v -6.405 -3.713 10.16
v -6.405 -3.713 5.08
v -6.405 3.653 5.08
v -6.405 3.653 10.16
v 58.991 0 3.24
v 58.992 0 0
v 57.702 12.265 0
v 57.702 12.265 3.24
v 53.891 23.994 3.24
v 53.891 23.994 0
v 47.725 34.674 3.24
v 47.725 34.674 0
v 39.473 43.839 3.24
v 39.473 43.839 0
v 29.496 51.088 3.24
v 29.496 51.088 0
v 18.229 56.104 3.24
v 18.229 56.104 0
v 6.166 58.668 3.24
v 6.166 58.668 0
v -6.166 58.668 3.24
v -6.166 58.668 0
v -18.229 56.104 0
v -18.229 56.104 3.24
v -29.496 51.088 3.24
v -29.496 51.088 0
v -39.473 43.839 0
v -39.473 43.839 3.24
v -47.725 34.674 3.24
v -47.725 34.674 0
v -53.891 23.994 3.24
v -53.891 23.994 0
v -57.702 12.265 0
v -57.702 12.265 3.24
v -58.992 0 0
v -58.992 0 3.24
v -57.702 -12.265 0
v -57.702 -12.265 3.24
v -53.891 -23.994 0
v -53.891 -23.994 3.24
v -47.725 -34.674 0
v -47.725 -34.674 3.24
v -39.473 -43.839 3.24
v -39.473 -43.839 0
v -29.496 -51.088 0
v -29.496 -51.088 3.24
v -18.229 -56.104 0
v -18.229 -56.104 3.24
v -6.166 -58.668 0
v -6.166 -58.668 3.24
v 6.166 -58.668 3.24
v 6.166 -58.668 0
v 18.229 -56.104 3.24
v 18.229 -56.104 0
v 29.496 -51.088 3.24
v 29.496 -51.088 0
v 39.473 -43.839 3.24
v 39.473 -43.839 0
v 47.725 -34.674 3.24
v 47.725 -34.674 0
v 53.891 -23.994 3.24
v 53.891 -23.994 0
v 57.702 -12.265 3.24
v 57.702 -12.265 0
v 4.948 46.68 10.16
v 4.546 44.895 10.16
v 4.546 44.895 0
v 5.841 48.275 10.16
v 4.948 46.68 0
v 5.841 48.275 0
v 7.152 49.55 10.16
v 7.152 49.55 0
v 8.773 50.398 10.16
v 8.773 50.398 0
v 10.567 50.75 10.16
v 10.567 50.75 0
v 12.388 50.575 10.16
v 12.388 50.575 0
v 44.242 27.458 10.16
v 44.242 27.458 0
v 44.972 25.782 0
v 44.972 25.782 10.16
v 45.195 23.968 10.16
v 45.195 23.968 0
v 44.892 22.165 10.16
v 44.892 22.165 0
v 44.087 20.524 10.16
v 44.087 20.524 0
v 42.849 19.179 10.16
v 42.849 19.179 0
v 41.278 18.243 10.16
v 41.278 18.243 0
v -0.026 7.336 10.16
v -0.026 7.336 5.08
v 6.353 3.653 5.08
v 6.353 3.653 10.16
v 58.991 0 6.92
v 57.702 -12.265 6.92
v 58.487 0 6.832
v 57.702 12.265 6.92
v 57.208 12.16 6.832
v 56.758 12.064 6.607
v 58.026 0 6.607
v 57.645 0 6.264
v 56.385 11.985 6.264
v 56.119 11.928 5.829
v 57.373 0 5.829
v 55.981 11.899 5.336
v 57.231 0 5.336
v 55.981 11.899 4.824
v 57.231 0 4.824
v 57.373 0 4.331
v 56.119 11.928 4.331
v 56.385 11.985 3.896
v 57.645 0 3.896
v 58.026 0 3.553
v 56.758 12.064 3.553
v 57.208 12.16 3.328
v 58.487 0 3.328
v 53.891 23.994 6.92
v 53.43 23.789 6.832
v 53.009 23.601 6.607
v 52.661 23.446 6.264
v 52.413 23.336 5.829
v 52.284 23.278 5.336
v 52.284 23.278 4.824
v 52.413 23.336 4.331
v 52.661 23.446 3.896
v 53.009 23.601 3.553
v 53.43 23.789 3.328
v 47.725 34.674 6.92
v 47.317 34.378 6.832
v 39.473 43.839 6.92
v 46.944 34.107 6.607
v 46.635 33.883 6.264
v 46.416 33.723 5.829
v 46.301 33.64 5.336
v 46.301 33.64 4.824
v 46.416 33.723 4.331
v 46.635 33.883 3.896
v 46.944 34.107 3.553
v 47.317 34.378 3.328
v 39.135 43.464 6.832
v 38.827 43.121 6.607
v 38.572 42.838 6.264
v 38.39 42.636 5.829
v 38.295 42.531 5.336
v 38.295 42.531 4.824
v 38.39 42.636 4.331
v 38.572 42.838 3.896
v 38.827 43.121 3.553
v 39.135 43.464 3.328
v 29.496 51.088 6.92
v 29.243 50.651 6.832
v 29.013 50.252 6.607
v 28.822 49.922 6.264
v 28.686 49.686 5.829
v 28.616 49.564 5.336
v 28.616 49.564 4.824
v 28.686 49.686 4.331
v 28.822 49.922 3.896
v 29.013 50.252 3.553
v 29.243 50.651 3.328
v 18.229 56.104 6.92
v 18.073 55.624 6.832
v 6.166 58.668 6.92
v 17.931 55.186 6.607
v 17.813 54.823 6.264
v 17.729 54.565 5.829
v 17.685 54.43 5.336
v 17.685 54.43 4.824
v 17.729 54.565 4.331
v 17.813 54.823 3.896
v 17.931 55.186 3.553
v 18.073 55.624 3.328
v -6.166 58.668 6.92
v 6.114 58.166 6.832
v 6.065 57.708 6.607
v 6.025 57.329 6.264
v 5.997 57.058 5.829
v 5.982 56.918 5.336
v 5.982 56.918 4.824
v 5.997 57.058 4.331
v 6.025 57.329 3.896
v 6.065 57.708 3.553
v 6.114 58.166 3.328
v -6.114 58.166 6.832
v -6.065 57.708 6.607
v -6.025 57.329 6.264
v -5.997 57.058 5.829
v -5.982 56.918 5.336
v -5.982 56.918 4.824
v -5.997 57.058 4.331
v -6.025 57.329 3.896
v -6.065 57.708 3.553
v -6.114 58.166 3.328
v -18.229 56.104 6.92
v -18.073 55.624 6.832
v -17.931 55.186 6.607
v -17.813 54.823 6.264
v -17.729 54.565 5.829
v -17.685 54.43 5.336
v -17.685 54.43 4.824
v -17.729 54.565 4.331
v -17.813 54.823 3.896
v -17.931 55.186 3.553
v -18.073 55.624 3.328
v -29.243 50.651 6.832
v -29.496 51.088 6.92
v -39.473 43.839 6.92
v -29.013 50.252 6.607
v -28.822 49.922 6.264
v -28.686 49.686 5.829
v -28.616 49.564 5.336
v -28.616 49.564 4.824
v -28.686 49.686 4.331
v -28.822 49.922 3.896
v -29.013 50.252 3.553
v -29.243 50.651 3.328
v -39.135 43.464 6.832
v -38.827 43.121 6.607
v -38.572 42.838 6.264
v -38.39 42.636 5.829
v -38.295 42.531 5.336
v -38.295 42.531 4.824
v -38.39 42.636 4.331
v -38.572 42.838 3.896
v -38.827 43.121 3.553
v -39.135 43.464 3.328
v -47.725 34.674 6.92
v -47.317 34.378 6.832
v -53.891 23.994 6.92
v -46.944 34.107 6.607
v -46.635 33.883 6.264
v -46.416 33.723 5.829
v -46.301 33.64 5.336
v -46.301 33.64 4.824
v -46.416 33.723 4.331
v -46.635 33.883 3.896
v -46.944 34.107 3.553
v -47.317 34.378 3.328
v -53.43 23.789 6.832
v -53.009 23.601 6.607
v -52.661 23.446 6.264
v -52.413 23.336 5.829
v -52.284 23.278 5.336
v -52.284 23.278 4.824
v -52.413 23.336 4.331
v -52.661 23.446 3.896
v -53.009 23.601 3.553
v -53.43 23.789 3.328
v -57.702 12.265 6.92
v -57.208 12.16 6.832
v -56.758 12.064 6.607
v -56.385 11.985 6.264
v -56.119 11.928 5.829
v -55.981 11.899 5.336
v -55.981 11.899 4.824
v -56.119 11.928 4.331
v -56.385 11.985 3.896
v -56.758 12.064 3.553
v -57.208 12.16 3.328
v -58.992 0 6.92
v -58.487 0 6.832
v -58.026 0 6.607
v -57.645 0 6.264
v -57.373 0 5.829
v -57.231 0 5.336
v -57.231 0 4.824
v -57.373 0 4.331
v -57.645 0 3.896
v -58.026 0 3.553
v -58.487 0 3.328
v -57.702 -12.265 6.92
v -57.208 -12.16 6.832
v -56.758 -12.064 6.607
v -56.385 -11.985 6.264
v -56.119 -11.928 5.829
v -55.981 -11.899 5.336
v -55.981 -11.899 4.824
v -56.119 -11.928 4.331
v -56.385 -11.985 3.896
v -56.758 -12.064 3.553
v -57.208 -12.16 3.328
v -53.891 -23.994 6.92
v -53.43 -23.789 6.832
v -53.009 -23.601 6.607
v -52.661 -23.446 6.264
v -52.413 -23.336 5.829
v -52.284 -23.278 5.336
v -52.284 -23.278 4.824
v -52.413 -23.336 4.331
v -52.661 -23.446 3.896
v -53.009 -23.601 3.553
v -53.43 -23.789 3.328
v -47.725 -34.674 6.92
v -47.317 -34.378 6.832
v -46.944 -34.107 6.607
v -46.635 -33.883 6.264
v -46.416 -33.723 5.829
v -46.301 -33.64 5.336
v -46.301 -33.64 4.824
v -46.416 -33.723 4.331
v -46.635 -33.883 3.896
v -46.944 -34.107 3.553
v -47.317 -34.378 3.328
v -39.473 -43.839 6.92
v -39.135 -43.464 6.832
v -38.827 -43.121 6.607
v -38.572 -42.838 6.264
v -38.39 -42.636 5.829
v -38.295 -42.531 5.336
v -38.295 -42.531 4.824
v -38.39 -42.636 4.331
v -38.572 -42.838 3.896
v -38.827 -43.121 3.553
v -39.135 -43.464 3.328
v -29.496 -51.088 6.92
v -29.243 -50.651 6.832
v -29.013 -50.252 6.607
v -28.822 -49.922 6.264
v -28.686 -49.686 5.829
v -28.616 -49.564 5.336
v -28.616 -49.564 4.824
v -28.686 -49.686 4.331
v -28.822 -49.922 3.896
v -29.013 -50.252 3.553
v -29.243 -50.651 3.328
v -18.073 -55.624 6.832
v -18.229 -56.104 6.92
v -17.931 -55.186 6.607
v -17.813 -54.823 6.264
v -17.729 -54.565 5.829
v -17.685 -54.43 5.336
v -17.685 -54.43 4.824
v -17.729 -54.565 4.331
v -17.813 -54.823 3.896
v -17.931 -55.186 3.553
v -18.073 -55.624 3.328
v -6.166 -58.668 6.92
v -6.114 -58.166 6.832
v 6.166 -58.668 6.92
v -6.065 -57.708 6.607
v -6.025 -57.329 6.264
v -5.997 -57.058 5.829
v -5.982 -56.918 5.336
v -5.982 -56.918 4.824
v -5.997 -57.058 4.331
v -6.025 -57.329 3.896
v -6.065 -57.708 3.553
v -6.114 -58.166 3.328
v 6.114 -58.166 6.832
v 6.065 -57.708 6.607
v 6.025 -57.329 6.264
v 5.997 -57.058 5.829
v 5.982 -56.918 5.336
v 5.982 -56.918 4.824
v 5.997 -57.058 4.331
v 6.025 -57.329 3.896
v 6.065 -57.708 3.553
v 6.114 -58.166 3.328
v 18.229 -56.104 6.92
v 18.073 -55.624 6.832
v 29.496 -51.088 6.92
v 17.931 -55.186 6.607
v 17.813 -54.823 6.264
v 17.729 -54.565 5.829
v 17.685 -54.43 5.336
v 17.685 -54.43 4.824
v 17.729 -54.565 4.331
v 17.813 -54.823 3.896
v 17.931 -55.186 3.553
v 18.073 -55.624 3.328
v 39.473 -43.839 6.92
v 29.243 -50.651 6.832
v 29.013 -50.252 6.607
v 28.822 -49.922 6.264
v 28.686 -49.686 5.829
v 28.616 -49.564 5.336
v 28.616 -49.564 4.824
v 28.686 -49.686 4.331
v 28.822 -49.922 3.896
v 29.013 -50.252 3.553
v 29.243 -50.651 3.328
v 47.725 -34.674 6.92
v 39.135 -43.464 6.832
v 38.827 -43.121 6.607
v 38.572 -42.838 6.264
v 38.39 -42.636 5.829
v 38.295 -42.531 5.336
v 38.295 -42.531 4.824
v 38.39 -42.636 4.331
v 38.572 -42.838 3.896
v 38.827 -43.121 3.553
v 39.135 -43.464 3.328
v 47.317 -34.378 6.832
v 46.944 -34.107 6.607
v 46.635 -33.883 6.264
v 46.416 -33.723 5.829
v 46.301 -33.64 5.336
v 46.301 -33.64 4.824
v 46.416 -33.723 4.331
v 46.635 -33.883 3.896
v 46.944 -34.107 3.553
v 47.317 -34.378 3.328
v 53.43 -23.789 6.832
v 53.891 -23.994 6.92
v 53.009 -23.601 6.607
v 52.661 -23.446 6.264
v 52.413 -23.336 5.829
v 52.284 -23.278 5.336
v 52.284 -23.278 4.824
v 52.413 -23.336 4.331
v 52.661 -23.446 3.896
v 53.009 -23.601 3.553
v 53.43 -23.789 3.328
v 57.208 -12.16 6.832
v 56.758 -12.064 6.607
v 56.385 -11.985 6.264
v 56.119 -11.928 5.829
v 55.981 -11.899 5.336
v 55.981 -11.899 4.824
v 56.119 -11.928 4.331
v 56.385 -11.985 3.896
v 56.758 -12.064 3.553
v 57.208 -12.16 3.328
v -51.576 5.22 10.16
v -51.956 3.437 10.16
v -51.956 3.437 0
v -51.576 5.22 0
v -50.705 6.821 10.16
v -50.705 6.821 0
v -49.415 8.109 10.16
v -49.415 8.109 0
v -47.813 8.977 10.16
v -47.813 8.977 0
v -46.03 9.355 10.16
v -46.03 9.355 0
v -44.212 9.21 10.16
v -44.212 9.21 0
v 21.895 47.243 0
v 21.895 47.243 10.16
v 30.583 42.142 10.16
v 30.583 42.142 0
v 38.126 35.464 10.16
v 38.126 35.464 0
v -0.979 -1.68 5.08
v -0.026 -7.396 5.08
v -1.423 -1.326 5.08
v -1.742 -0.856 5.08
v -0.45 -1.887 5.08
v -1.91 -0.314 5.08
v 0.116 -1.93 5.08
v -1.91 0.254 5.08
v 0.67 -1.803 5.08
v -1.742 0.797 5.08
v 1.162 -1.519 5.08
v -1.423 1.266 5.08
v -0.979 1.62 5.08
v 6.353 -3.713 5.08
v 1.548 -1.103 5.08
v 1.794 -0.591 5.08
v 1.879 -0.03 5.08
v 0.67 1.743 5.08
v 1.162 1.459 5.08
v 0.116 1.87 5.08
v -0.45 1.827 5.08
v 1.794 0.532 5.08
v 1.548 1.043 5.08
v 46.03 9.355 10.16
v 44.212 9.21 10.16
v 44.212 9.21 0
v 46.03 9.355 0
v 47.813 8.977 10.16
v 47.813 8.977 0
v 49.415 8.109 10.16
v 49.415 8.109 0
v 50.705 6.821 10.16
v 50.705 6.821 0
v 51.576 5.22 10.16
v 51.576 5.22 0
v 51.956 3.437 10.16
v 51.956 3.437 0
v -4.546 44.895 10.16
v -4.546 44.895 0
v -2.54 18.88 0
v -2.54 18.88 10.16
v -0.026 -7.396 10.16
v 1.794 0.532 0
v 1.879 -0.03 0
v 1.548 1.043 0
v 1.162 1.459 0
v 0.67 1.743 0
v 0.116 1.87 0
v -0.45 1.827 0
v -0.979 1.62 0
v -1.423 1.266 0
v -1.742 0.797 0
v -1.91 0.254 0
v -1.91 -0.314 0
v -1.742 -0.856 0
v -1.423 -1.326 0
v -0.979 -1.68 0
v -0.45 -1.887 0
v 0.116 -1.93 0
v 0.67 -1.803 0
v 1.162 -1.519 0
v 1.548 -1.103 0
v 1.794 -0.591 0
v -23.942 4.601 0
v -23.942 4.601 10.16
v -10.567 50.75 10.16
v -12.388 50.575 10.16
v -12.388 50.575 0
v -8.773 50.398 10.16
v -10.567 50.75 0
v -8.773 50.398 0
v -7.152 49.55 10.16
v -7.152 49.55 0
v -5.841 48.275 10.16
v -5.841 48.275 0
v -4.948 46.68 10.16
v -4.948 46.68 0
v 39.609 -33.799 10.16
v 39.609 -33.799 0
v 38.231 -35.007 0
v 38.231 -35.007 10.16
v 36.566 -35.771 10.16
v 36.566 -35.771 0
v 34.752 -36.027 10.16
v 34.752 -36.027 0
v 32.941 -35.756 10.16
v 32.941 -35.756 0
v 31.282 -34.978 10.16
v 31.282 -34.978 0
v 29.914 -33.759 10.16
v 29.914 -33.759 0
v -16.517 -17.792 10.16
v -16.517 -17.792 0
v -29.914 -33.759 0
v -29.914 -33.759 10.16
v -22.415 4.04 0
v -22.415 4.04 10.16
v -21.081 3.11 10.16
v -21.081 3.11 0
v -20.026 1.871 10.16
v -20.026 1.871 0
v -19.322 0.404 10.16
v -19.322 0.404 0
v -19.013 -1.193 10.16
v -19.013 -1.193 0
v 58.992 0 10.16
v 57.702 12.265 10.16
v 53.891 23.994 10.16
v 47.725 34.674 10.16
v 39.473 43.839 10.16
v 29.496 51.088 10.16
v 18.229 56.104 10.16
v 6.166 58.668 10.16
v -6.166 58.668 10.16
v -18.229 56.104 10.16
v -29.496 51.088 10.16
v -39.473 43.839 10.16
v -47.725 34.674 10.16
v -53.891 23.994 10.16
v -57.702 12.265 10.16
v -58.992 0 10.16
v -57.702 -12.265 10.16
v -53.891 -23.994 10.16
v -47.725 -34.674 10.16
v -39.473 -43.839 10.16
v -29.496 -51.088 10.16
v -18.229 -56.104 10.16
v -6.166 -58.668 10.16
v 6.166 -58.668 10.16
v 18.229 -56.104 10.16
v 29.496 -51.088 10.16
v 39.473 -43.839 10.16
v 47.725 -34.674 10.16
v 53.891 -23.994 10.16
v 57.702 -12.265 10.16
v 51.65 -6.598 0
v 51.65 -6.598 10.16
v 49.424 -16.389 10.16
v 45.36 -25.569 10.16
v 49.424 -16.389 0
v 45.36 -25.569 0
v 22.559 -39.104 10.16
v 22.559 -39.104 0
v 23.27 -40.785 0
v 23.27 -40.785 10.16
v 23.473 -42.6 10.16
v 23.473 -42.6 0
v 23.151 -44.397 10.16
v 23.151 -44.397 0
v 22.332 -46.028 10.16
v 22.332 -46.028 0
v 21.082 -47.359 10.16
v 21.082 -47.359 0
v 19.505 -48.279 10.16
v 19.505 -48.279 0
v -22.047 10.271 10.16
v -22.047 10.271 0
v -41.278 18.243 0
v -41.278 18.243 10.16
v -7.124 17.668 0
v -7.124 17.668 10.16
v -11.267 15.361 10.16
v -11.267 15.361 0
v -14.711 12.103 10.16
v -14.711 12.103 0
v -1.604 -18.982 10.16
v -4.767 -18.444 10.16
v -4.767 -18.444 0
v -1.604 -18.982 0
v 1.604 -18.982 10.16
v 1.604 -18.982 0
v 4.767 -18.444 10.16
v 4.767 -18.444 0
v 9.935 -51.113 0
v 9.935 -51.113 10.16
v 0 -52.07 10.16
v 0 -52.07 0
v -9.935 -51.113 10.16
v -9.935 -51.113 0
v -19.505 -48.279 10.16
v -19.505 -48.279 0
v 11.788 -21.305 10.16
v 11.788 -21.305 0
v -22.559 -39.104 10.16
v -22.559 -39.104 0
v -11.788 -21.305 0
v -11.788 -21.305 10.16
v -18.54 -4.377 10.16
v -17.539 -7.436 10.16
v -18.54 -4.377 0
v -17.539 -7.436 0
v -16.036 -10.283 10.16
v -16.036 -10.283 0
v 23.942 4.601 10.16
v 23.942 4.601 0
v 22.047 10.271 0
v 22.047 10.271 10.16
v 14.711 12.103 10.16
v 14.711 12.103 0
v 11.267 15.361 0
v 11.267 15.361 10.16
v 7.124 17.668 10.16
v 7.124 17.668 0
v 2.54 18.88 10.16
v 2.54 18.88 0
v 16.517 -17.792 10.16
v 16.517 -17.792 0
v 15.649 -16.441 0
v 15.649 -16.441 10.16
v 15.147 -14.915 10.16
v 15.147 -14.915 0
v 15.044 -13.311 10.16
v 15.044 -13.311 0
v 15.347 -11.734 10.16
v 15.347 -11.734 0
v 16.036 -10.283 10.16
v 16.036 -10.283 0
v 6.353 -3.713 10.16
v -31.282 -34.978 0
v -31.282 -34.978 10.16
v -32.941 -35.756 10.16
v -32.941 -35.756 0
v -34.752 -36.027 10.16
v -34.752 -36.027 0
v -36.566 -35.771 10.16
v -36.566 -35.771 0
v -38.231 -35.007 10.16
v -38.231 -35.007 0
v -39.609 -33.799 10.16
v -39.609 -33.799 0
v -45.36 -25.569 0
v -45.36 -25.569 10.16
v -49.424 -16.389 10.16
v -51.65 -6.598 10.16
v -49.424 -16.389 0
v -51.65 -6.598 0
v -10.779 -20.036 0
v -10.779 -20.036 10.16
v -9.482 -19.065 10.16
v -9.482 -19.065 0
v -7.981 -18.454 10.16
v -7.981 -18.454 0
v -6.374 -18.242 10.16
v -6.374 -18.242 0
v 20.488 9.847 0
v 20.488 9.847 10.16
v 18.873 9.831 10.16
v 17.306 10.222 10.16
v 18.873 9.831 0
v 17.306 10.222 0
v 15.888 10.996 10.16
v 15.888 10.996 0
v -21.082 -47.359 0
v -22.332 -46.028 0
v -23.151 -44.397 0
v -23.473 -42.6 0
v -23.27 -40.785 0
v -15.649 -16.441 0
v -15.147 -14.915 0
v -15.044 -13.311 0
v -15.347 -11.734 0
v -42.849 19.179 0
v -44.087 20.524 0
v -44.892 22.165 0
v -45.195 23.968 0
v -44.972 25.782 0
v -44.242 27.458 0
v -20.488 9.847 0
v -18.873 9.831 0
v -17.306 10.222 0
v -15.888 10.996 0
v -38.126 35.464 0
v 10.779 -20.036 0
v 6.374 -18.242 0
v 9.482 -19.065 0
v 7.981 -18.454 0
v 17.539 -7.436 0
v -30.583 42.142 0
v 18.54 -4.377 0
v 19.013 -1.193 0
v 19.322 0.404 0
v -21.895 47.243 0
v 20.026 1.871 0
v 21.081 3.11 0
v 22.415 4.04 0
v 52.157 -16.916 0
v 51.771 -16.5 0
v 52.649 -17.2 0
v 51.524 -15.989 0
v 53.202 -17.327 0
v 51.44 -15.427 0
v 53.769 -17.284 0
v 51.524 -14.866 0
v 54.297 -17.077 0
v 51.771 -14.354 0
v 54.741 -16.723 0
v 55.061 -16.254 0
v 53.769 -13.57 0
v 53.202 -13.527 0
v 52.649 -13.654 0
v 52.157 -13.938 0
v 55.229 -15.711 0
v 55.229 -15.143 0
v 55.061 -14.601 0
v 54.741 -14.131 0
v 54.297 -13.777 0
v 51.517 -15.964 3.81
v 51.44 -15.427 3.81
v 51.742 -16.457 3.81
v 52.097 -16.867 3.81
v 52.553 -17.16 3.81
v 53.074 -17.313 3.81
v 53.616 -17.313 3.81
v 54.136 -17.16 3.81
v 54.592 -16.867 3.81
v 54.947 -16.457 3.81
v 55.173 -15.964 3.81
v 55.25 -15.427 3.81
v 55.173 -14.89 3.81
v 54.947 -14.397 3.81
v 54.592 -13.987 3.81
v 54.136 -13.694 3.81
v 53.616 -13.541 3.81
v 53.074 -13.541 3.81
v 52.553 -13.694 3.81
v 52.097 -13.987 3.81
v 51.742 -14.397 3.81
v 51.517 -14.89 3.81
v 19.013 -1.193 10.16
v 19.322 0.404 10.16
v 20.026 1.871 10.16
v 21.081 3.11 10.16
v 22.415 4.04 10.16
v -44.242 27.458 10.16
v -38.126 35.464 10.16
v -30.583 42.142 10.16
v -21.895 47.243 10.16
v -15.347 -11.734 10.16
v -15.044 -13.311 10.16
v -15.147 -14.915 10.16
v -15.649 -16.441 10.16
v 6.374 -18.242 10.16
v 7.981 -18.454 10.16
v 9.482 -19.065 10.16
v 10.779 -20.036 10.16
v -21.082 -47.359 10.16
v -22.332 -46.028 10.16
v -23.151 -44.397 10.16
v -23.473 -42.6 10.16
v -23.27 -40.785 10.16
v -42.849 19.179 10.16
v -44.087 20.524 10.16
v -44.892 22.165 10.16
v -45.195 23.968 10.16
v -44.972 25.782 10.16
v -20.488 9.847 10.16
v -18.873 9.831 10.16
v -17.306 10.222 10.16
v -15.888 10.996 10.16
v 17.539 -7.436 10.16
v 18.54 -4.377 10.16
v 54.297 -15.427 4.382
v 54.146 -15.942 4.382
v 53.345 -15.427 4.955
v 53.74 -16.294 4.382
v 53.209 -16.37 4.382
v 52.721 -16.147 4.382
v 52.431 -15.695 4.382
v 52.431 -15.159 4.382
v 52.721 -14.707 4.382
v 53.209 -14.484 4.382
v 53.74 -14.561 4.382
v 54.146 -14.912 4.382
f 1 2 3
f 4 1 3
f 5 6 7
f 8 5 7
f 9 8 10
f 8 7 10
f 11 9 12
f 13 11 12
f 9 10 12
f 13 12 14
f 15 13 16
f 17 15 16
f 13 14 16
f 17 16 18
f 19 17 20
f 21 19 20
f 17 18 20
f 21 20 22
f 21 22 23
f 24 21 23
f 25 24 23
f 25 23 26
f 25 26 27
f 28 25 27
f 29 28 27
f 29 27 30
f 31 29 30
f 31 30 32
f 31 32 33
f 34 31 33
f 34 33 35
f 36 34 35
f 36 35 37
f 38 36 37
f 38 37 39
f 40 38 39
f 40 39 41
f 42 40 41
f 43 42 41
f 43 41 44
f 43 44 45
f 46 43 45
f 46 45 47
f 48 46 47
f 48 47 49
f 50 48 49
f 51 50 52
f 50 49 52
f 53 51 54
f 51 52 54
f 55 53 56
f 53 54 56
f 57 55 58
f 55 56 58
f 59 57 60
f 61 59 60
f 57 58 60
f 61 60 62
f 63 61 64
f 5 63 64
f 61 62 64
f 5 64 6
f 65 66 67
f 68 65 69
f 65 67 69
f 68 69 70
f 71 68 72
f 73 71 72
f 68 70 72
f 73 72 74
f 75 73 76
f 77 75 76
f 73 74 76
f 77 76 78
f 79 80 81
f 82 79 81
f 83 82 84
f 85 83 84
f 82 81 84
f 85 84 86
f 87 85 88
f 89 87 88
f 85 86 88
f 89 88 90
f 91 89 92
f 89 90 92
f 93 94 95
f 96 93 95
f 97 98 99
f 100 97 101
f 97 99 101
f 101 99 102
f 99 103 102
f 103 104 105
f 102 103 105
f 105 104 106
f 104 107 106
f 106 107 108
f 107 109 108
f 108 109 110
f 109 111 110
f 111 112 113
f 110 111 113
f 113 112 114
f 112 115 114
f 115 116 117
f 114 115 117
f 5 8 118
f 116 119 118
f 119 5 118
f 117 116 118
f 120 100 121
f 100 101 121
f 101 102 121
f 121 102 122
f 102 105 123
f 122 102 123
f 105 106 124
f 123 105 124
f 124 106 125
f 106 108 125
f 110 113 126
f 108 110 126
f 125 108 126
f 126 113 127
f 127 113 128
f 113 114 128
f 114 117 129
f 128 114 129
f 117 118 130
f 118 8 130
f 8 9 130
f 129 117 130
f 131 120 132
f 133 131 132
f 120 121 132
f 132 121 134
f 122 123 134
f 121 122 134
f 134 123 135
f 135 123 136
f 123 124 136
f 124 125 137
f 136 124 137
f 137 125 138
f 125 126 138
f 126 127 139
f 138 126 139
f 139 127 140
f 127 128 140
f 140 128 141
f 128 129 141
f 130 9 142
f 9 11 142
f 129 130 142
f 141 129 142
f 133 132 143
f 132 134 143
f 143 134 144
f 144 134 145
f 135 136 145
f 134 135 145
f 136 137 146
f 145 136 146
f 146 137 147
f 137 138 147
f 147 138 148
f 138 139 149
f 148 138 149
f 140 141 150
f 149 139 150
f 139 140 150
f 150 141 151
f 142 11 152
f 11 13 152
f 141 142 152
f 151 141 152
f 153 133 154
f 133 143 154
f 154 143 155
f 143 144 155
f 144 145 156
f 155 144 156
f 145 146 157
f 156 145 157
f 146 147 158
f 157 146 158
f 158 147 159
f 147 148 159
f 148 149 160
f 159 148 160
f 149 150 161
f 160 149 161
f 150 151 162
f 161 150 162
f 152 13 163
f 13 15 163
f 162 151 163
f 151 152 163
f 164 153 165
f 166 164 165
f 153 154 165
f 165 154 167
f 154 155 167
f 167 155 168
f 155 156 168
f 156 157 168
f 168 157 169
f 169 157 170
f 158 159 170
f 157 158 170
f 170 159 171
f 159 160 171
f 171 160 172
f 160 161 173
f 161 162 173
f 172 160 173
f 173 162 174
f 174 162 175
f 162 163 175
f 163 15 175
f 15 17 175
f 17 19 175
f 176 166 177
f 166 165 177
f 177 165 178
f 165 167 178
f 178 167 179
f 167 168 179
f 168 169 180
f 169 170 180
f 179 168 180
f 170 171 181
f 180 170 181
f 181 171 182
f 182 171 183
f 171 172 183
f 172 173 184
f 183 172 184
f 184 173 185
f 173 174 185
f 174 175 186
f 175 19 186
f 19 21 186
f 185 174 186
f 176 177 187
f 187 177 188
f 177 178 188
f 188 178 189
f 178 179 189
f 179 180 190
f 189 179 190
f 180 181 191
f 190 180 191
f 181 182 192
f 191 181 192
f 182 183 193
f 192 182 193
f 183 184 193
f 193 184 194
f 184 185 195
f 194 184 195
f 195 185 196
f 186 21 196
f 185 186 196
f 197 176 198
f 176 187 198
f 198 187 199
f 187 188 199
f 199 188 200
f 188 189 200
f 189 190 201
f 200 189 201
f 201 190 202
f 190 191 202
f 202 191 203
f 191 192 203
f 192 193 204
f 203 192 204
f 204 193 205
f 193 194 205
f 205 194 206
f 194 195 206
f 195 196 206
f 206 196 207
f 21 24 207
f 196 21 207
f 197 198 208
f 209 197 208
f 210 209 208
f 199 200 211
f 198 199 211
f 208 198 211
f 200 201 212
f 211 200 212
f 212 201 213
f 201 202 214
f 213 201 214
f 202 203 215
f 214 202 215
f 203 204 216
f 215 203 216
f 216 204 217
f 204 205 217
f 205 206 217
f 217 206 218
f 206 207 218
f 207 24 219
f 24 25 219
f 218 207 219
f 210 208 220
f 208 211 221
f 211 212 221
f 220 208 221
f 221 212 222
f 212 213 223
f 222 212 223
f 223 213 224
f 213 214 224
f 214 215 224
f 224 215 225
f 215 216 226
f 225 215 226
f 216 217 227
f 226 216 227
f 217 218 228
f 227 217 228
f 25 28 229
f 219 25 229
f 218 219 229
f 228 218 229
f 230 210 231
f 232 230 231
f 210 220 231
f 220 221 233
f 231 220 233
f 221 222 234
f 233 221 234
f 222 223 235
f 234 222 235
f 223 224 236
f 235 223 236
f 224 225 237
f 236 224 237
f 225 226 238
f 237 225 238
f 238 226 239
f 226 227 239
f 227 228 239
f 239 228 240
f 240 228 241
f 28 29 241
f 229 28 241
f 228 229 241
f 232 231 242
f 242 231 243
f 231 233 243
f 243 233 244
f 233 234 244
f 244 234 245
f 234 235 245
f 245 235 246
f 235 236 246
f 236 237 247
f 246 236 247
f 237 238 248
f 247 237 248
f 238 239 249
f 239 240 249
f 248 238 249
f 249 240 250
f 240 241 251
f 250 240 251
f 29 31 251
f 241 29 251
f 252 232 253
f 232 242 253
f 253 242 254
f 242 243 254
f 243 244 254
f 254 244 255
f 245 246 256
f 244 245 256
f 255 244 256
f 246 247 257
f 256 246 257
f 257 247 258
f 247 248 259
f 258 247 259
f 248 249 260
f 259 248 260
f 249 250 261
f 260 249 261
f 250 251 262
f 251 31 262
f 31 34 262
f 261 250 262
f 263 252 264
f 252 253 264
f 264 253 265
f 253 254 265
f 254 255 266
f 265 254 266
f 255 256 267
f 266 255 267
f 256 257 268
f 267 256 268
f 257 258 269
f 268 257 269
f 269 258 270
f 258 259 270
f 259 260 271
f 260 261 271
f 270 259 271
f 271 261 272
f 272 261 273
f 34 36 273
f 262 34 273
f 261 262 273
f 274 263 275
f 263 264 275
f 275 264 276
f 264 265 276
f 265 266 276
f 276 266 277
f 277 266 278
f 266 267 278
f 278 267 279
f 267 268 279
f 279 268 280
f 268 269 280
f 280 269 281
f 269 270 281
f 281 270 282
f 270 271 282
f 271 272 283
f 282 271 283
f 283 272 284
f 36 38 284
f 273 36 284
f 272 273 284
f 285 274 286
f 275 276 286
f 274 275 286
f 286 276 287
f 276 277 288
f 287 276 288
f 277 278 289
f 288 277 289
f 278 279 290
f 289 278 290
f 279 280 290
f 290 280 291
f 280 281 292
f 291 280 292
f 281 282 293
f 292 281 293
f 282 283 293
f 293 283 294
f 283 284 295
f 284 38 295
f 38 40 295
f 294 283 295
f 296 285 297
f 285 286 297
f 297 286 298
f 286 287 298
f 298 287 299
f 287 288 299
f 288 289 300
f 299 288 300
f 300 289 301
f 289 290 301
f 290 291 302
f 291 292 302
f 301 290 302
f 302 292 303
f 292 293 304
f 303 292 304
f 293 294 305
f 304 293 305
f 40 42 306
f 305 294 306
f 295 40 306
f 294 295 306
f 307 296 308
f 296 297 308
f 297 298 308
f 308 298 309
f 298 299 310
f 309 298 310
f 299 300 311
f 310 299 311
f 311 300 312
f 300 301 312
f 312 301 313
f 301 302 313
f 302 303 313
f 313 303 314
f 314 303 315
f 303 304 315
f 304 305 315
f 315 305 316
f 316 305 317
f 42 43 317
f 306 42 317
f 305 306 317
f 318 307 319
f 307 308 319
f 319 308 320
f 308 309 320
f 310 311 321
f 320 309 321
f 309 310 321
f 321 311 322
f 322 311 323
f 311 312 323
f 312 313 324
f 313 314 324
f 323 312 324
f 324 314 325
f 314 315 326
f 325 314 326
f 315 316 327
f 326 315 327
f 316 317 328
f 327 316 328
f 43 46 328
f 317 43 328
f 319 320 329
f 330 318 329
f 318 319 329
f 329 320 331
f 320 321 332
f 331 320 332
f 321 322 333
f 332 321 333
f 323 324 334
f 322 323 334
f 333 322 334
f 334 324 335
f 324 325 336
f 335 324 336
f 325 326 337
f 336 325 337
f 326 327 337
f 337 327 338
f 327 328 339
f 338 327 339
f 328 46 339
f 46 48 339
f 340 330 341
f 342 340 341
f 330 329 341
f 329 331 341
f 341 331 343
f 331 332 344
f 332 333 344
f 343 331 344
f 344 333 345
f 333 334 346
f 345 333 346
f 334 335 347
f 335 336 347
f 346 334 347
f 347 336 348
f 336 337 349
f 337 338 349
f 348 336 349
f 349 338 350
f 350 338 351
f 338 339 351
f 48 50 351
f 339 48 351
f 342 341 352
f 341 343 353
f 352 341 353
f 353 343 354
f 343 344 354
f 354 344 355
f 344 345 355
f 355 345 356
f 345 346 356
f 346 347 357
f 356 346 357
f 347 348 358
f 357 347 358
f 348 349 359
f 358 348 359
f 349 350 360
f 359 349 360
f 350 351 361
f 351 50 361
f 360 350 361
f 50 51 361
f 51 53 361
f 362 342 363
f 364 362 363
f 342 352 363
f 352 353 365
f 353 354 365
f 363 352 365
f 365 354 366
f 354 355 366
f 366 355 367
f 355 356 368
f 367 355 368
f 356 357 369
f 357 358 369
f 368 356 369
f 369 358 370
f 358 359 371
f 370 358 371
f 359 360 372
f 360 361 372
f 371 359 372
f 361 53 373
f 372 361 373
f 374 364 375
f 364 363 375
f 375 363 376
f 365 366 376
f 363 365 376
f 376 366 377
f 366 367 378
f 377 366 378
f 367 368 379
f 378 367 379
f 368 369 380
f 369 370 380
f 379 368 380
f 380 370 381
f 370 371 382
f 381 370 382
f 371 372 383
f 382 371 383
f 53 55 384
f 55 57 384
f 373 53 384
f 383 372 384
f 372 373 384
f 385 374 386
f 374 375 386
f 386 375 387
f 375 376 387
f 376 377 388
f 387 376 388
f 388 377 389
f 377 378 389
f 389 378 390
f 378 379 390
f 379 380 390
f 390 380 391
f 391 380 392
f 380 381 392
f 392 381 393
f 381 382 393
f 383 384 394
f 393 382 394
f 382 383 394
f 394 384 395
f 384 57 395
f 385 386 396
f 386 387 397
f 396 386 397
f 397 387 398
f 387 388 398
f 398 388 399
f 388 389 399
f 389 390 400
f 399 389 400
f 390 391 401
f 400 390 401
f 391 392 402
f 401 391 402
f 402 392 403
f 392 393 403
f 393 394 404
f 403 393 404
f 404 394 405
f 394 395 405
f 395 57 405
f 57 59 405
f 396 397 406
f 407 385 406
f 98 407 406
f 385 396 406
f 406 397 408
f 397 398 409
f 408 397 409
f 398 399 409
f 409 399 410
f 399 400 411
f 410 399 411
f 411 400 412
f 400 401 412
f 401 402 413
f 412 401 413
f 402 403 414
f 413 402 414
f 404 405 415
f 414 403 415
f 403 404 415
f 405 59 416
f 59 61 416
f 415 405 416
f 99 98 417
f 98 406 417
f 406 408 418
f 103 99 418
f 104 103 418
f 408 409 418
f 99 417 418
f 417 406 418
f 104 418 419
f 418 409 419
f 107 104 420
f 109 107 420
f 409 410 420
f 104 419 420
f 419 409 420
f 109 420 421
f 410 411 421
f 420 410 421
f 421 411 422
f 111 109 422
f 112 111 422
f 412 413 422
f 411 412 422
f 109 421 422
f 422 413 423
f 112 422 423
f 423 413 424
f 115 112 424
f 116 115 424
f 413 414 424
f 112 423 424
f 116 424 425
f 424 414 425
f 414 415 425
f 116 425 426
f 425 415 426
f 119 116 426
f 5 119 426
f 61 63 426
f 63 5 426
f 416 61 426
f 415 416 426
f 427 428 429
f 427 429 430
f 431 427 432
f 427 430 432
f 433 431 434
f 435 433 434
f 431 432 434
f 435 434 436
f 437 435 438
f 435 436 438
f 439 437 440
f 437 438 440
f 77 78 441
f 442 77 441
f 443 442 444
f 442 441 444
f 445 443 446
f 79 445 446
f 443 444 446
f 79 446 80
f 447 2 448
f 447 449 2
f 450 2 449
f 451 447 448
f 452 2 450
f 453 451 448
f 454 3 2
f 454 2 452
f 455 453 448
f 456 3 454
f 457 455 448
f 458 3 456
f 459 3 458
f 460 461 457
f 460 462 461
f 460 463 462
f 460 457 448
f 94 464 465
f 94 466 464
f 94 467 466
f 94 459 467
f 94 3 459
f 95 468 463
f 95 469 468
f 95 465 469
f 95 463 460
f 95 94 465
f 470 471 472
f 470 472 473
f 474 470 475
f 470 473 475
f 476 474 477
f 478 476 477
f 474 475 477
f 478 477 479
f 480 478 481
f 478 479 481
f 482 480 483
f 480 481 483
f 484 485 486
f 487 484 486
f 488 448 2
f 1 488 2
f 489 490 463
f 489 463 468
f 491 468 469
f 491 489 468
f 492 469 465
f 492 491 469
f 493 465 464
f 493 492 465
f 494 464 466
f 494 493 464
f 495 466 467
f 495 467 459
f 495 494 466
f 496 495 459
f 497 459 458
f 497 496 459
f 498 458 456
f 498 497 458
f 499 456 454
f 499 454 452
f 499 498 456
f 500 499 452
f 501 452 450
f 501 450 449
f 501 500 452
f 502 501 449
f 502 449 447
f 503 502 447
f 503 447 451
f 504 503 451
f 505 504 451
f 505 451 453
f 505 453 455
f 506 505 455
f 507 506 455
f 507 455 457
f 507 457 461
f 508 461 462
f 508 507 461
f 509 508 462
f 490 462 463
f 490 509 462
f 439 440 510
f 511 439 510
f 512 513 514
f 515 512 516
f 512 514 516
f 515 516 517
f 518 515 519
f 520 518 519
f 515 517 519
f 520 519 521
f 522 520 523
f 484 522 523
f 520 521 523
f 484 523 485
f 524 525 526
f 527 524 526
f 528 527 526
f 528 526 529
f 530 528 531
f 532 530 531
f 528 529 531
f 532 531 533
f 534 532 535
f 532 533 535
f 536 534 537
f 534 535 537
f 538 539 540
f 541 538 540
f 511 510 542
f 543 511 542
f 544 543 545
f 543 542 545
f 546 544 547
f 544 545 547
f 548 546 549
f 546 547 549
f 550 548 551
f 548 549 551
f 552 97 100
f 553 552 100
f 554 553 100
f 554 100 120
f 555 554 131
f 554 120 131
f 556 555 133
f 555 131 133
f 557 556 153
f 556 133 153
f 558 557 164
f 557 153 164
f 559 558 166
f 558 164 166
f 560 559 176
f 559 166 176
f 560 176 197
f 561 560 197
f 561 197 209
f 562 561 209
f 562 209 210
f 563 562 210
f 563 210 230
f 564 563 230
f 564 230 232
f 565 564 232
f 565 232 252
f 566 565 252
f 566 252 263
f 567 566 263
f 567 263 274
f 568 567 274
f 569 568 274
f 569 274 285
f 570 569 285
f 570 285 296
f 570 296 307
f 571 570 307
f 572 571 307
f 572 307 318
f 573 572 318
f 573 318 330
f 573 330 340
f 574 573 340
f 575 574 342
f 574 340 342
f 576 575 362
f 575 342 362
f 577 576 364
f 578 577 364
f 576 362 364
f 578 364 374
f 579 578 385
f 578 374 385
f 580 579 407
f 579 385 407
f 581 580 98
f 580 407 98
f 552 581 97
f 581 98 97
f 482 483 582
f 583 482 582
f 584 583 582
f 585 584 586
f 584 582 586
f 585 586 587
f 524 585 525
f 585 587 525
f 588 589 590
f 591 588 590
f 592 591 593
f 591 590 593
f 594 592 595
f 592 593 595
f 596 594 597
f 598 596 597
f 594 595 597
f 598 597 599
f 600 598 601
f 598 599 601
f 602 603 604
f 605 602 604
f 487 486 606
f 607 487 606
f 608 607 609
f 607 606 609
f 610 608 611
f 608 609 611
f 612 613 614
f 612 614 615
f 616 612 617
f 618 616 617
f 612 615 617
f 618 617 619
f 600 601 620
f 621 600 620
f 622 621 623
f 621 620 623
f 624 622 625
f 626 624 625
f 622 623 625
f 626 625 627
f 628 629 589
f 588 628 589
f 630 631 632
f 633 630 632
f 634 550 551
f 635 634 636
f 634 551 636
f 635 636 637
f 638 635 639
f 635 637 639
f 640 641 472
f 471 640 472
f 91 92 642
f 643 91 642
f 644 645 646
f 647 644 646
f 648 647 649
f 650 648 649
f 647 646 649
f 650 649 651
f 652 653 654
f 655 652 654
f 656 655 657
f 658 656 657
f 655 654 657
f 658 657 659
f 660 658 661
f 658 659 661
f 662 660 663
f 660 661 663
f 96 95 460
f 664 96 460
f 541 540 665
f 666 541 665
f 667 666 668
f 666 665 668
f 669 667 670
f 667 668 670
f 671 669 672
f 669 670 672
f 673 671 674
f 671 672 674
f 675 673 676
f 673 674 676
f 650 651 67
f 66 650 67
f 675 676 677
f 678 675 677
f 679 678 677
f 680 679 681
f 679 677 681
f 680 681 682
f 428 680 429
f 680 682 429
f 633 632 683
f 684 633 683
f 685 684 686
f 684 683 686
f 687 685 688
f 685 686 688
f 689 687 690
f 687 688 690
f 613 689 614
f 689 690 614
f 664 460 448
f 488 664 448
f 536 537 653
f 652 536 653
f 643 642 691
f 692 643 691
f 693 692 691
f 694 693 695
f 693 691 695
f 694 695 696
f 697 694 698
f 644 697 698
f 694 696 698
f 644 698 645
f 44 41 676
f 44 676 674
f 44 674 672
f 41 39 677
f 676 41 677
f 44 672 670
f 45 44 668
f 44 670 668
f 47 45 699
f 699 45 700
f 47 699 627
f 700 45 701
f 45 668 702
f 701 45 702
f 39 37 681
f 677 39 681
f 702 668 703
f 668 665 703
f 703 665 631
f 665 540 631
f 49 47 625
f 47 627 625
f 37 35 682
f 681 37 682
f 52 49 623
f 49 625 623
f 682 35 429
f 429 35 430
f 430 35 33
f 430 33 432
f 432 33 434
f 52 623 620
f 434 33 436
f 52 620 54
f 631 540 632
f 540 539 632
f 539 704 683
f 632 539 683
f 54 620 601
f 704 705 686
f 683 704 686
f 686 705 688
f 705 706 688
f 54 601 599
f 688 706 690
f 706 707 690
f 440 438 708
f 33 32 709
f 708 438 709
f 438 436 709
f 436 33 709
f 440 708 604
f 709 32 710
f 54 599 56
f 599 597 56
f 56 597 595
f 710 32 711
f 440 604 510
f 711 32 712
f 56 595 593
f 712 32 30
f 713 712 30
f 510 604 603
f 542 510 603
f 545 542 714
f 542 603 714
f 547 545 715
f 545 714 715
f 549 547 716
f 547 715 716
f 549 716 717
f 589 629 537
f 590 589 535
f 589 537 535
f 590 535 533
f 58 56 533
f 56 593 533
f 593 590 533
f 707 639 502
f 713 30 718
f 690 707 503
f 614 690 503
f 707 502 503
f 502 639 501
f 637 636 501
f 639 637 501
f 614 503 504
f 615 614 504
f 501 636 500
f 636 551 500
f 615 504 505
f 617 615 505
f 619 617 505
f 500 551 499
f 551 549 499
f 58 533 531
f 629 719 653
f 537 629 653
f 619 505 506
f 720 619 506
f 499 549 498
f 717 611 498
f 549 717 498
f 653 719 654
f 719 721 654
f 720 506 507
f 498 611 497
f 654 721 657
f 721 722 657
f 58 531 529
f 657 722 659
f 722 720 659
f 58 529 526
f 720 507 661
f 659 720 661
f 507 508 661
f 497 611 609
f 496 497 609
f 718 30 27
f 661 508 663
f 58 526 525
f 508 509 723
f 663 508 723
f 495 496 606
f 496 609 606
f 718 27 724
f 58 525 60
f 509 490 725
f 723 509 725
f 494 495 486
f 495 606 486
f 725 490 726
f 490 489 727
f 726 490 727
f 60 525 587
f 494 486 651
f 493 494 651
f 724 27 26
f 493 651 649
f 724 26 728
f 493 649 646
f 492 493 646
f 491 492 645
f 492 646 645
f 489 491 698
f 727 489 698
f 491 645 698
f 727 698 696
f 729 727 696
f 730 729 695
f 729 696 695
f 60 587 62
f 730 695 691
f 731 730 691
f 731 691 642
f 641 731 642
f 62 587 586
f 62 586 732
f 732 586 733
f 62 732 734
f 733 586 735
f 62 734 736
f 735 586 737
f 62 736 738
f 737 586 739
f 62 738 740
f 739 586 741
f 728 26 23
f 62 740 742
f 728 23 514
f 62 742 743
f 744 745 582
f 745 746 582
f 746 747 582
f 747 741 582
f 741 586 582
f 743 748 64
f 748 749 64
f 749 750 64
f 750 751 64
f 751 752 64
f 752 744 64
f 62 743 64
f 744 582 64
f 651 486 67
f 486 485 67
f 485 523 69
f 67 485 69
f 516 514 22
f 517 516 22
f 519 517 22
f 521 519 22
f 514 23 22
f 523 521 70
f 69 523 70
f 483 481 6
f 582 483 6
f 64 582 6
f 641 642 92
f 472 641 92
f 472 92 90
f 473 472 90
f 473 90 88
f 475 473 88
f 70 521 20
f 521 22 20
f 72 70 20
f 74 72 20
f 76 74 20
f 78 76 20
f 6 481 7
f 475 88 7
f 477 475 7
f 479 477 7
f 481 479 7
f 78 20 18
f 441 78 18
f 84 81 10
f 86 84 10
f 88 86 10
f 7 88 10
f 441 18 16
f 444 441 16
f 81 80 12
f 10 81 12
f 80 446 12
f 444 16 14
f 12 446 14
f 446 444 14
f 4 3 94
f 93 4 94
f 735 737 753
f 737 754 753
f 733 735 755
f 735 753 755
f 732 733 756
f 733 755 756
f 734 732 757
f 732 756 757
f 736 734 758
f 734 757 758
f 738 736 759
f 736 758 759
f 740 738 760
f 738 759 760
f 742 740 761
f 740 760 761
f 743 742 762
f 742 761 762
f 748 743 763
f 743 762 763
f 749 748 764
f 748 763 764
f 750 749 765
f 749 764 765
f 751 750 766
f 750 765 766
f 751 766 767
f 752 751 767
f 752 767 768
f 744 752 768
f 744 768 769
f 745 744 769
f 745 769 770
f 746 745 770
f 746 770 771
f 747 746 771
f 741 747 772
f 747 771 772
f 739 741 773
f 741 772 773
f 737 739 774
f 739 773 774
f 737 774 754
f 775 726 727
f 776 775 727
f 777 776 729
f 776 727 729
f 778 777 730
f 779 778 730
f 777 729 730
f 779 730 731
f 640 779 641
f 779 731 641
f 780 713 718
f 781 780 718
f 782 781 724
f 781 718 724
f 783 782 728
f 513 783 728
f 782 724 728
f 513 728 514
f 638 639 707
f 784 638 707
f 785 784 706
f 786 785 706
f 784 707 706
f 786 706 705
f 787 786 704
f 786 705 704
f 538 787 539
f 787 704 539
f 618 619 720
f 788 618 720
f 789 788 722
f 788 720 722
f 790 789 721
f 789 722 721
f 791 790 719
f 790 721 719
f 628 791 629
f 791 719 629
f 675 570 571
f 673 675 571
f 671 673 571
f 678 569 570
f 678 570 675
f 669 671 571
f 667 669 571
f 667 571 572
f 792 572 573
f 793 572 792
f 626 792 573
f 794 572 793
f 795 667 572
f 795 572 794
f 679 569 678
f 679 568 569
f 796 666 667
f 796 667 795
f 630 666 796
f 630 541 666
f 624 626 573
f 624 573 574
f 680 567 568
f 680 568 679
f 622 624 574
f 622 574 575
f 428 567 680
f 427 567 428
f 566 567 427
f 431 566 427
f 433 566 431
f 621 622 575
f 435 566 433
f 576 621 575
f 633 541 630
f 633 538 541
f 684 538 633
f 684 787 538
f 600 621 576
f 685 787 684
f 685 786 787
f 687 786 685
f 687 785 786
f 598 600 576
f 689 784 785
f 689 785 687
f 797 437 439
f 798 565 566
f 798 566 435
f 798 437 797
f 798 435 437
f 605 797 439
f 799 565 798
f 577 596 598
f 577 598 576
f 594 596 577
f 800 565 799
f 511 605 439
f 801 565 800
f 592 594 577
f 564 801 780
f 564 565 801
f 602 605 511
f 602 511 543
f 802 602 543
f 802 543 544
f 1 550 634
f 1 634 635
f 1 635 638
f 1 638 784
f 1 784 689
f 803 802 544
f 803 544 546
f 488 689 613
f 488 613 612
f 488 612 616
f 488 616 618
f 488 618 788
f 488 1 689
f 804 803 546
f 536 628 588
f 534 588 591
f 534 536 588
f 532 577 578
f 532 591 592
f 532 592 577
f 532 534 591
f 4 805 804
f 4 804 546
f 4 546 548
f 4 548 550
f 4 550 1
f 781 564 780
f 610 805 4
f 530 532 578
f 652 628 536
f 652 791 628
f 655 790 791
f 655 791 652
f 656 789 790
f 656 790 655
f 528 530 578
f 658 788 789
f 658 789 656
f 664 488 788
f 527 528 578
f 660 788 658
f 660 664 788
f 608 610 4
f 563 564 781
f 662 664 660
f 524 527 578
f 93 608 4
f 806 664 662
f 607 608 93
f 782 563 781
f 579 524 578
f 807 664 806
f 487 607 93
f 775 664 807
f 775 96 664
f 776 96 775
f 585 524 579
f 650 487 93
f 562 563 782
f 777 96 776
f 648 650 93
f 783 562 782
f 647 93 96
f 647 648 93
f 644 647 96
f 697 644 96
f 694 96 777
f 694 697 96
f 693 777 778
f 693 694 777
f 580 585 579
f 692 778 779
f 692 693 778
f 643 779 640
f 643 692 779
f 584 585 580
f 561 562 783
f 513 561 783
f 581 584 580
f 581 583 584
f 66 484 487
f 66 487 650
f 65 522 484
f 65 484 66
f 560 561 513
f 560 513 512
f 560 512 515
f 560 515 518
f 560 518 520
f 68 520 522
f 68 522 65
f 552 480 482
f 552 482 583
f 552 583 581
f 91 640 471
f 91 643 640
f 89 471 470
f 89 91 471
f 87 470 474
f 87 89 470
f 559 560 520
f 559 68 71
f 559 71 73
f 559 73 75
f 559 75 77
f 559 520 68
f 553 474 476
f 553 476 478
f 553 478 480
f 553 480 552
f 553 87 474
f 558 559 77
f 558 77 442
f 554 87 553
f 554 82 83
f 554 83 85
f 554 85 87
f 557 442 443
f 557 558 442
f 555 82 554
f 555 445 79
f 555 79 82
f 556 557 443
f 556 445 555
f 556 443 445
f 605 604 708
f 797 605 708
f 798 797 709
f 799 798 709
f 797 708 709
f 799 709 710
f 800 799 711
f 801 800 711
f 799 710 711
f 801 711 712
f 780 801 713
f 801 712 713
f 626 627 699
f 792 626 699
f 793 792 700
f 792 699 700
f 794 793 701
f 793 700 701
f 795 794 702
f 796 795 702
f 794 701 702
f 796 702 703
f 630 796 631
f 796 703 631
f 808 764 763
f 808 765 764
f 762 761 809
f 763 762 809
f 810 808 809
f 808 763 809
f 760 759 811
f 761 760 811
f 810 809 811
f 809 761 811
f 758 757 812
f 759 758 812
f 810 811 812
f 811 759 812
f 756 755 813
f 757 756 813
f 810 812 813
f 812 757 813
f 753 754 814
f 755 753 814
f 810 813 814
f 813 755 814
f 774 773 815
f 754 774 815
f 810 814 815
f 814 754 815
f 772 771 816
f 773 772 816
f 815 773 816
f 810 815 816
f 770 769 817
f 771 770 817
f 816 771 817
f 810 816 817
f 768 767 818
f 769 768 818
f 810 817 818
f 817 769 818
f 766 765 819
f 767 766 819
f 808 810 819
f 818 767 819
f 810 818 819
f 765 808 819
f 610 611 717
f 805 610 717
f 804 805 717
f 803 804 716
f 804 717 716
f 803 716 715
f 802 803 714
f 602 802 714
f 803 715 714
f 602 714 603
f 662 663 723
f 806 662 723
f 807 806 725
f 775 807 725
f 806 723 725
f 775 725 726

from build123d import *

# Parameters (mm, degrees)
F0_R     = 1.905
F1_DEPTH = 5.08
F0_R_2   = 58.9915
F2_DEPTH = 10.16
F3_R     = 1.8415
F7_D     = 3.81
F7_DEPTH = 3.81
F7_TIP   = 1.1446394792


with BuildPart() as f1:
    # F0 (on Top) → F1 (new body)
    with BuildSketch(Plane.XY):
        Polygon((-6.4052528628, -3.7129219378), (-0.0261097385, -7.3959219378), (6.3530333858, -3.7129219378), (6.3530333858, 3.6530780622), (-0.0261097385, 7.3360780622), (-6.4052528628, 3.6530780622), align=None)
        with Locations((-0.0261097385, -0.0299219378)):
            Circle(F0_R, mode=Mode.SUBTRACT)
    extrude(amount=F1_DEPTH)

    # F0 (on Top) → F2 (join)
    with BuildSketch(Plane.XY):
        Circle(F0_R_2)
        with BuildLine():
            Line((-44.2124819173, 9.2097946363), (-23.9423226363, 4.6011586921))
            ThreePointArc((-23.9423226363, 4.6011586921), (-20.5137110236, 2.5239744907), (-19.0126005957, -1.1931129822))
            ThreePointArc((-19.0126005957, -1.1931129822), (-18.1042521178, -5.9277782732), (-16.0364137318, -10.2827979958))
            ThreePointArc((-16.0364137318, -10.2827979958), (-15.0448681501, -14.1162516757), (-16.5173341467, -17.7918976931))
            Line((-16.5173341467, -17.7918976931), (-29.9142206112, -33.7590248091))
            ThreePointArc((-29.9142206112, -33.7590248091), (-34.752324822, -36.0274693708), (-39.6091563625, -33.7994028387))
            ThreePointArc((-39.6091563625, -33.7994028387), (-49.423694035, -16.3885132924), (-51.9564452709, 3.4369601117))
            ThreePointArc((-51.9564452709, 3.4369601117), (-49.4154929179, 8.1088853878), (-44.2124819173, 9.2097946363))
        make_face(mode=Mode.SUBTRACT)
        Polygon((6.3530333858, -3.7129219378), (-0.0261097385, -7.3959219378), (-6.4052528628, -3.7129219378), (-6.4052528628, 3.6530780622), (-0.0261097385, 7.3360780622), (6.3530333858, 3.6530780622), align=None, mode=Mode.SUBTRACT)
        with BuildLine():
            ThreePointArc((-11.7881374723, -21.3045429378), (-8.7511162218, -18.7113231264), (-4.766540139, -18.4440395549))
            ThreePointArc((-4.766540139, -18.4440395549), (0, -19.05), (4.766540139, -18.4440395549))
            ThreePointArc((4.766540139, -18.4440395549), (8.7511162218, -18.7113231264), (11.7881374723, -21.3045429378))
            Line((11.7881374723, -21.3045429378), (22.5588981673, -39.1036858663))
            ThreePointArc((22.5588981673, -39.1036858663), (23.1511277222, -44.3967165208), (19.5047791508, -48.2788617334))
            ThreePointArc((19.5047791508, -48.2788617334), (0, -52.07), (-19.5047791508, -48.2788617334))
            ThreePointArc((-19.5047791508, -48.2788617334), (-23.1511277222, -44.3967165208), (-22.5588981673, -39.1036858663))
            Line((-22.5588981673, -39.1036858663), (-11.7881374723, -21.3045429378))
        make_face(mode=Mode.SUBTRACT)
        with Locations((53.3448168004, -15.4270773673)):
            Circle(F0_R, mode=Mode.SUBTRACT)
        with BuildLine():
            Line((29.9142206112, -33.7590248091), (16.5173341467, -17.7918976931))
            ThreePointArc((16.5173341467, -17.7918976931), (15.0448681501, -14.1162516757), (16.0364137318, -10.2827979958))
            ThreePointArc((16.0364137318, -10.2827979958), (18.1042521178, -5.9277782732), (19.0126005957, -1.1931129822))
            ThreePointArc((19.0126005957, -1.1931129822), (20.5137110236, 2.5239744907), (23.9423226363, 4.6011586921))
            Line((23.9423226363, 4.6011586921), (44.2124819173, 9.2097946363))
            ThreePointArc((44.2124819173, 9.2097946363), (49.4154929179, 8.1088853878), (51.9564452709, 3.4369601117))
            ThreePointArc((51.9564452709, 3.4369601117), (49.423694035, -16.3885132924), (39.6091563625, -33.7994028387))
            ThreePointArc((39.6091563625, -33.7994028387), (34.752324822, -36.0274693708), (29.9142206112, -33.7590248091))
        make_face(mode=Mode.SUBTRACT)
        with BuildLine():
            ThreePointArc((-12.3878761858, 50.5749485774), (-7.1524486585, 49.550133826), (-4.5459522271, 44.895445542))
            Line((-4.5459522271, 44.895445542), (-2.54, 18.8799073091))
            ThreePointArc((-2.54, 18.8799073091), (-9.267390723, 16.6438568003), (-14.7113573439, 12.1028288057))
            ThreePointArc((-14.7113573439, 12.1028288057), (-18.0767743108, 9.9762673559), (-22.0468294507, 10.2711523285))
            Line((-22.0468294507, 10.2711523285), (-41.2782743334, 18.243402288))
            ThreePointArc((-41.2782743334, 18.243402288), (-44.8916103761, 22.1650802153), (-44.2419474535, 27.4578765661))
            ThreePointArc((-44.2419474535, 27.4578765661), (-30.5832304695, 42.1420326284), (-12.3878761858, 50.5749485774))
        make_face(mode=Mode.SUBTRACT)
        with BuildLine():
            ThreePointArc((12.3878761858, 50.5749485774), (30.5832304695, 42.1420326284), (44.2419474535, 27.4578765661))
            ThreePointArc((44.2419474535, 27.4578765661), (44.8916103761, 22.1650802153), (41.2782743334, 18.243402288))
            Line((41.2782743334, 18.243402288), (22.0468294507, 10.2711523285))
            ThreePointArc((22.0468294507, 10.2711523285), (18.0767743108, 9.9762673559), (14.7113573439, 12.1028288057))
            ThreePointArc((14.7113573439, 12.1028288057), (9.267390723, 16.6438568003), (2.54, 18.8799073091))
            Line((2.54, 18.8799073091), (4.5459522271, 44.895445542))
            ThreePointArc((4.5459522271, 44.895445542), (7.1524486585, 49.550133826), (12.3878761858, 50.5749485774))
        make_face(mode=Mode.SUBTRACT)
        with Locations((53.3448168004, -15.4270773673)):
            Circle(F0_R)
    extrude(amount=F2_DEPTH)


with BuildPart() as f5:
    # F3 (on Front) → F5 (revolve)
    with BuildSketch(Plane.XZ):
        with Locations((59.055, 5.08)):
            Circle(F3_R)
    revolve(axis=Axis((0, 0, 4.4038342312), (0, 0, 1)))


with BuildPart() as f1_1:
    add(f1.part)

    # F6: cut F5
    add(f5.part, mode=Mode.SUBTRACT)

    # F7
    with Locations(Plane(origin=(0, 0, 0), x_dir=(1, 0, 0), z_dir=(0, 0, -1))):
        with Locations((53.3448168004, 15.4270773673)):
            Hole(F7_D / 2, depth=F7_DEPTH)
            with Locations((0, 0, -(F7_DEPTH + F7_TIP / 2))):  # 118° drill point
                Cone(0, F7_D / 2, F7_TIP, mode=Mode.SUBTRACT)


solid = f1_1.part
